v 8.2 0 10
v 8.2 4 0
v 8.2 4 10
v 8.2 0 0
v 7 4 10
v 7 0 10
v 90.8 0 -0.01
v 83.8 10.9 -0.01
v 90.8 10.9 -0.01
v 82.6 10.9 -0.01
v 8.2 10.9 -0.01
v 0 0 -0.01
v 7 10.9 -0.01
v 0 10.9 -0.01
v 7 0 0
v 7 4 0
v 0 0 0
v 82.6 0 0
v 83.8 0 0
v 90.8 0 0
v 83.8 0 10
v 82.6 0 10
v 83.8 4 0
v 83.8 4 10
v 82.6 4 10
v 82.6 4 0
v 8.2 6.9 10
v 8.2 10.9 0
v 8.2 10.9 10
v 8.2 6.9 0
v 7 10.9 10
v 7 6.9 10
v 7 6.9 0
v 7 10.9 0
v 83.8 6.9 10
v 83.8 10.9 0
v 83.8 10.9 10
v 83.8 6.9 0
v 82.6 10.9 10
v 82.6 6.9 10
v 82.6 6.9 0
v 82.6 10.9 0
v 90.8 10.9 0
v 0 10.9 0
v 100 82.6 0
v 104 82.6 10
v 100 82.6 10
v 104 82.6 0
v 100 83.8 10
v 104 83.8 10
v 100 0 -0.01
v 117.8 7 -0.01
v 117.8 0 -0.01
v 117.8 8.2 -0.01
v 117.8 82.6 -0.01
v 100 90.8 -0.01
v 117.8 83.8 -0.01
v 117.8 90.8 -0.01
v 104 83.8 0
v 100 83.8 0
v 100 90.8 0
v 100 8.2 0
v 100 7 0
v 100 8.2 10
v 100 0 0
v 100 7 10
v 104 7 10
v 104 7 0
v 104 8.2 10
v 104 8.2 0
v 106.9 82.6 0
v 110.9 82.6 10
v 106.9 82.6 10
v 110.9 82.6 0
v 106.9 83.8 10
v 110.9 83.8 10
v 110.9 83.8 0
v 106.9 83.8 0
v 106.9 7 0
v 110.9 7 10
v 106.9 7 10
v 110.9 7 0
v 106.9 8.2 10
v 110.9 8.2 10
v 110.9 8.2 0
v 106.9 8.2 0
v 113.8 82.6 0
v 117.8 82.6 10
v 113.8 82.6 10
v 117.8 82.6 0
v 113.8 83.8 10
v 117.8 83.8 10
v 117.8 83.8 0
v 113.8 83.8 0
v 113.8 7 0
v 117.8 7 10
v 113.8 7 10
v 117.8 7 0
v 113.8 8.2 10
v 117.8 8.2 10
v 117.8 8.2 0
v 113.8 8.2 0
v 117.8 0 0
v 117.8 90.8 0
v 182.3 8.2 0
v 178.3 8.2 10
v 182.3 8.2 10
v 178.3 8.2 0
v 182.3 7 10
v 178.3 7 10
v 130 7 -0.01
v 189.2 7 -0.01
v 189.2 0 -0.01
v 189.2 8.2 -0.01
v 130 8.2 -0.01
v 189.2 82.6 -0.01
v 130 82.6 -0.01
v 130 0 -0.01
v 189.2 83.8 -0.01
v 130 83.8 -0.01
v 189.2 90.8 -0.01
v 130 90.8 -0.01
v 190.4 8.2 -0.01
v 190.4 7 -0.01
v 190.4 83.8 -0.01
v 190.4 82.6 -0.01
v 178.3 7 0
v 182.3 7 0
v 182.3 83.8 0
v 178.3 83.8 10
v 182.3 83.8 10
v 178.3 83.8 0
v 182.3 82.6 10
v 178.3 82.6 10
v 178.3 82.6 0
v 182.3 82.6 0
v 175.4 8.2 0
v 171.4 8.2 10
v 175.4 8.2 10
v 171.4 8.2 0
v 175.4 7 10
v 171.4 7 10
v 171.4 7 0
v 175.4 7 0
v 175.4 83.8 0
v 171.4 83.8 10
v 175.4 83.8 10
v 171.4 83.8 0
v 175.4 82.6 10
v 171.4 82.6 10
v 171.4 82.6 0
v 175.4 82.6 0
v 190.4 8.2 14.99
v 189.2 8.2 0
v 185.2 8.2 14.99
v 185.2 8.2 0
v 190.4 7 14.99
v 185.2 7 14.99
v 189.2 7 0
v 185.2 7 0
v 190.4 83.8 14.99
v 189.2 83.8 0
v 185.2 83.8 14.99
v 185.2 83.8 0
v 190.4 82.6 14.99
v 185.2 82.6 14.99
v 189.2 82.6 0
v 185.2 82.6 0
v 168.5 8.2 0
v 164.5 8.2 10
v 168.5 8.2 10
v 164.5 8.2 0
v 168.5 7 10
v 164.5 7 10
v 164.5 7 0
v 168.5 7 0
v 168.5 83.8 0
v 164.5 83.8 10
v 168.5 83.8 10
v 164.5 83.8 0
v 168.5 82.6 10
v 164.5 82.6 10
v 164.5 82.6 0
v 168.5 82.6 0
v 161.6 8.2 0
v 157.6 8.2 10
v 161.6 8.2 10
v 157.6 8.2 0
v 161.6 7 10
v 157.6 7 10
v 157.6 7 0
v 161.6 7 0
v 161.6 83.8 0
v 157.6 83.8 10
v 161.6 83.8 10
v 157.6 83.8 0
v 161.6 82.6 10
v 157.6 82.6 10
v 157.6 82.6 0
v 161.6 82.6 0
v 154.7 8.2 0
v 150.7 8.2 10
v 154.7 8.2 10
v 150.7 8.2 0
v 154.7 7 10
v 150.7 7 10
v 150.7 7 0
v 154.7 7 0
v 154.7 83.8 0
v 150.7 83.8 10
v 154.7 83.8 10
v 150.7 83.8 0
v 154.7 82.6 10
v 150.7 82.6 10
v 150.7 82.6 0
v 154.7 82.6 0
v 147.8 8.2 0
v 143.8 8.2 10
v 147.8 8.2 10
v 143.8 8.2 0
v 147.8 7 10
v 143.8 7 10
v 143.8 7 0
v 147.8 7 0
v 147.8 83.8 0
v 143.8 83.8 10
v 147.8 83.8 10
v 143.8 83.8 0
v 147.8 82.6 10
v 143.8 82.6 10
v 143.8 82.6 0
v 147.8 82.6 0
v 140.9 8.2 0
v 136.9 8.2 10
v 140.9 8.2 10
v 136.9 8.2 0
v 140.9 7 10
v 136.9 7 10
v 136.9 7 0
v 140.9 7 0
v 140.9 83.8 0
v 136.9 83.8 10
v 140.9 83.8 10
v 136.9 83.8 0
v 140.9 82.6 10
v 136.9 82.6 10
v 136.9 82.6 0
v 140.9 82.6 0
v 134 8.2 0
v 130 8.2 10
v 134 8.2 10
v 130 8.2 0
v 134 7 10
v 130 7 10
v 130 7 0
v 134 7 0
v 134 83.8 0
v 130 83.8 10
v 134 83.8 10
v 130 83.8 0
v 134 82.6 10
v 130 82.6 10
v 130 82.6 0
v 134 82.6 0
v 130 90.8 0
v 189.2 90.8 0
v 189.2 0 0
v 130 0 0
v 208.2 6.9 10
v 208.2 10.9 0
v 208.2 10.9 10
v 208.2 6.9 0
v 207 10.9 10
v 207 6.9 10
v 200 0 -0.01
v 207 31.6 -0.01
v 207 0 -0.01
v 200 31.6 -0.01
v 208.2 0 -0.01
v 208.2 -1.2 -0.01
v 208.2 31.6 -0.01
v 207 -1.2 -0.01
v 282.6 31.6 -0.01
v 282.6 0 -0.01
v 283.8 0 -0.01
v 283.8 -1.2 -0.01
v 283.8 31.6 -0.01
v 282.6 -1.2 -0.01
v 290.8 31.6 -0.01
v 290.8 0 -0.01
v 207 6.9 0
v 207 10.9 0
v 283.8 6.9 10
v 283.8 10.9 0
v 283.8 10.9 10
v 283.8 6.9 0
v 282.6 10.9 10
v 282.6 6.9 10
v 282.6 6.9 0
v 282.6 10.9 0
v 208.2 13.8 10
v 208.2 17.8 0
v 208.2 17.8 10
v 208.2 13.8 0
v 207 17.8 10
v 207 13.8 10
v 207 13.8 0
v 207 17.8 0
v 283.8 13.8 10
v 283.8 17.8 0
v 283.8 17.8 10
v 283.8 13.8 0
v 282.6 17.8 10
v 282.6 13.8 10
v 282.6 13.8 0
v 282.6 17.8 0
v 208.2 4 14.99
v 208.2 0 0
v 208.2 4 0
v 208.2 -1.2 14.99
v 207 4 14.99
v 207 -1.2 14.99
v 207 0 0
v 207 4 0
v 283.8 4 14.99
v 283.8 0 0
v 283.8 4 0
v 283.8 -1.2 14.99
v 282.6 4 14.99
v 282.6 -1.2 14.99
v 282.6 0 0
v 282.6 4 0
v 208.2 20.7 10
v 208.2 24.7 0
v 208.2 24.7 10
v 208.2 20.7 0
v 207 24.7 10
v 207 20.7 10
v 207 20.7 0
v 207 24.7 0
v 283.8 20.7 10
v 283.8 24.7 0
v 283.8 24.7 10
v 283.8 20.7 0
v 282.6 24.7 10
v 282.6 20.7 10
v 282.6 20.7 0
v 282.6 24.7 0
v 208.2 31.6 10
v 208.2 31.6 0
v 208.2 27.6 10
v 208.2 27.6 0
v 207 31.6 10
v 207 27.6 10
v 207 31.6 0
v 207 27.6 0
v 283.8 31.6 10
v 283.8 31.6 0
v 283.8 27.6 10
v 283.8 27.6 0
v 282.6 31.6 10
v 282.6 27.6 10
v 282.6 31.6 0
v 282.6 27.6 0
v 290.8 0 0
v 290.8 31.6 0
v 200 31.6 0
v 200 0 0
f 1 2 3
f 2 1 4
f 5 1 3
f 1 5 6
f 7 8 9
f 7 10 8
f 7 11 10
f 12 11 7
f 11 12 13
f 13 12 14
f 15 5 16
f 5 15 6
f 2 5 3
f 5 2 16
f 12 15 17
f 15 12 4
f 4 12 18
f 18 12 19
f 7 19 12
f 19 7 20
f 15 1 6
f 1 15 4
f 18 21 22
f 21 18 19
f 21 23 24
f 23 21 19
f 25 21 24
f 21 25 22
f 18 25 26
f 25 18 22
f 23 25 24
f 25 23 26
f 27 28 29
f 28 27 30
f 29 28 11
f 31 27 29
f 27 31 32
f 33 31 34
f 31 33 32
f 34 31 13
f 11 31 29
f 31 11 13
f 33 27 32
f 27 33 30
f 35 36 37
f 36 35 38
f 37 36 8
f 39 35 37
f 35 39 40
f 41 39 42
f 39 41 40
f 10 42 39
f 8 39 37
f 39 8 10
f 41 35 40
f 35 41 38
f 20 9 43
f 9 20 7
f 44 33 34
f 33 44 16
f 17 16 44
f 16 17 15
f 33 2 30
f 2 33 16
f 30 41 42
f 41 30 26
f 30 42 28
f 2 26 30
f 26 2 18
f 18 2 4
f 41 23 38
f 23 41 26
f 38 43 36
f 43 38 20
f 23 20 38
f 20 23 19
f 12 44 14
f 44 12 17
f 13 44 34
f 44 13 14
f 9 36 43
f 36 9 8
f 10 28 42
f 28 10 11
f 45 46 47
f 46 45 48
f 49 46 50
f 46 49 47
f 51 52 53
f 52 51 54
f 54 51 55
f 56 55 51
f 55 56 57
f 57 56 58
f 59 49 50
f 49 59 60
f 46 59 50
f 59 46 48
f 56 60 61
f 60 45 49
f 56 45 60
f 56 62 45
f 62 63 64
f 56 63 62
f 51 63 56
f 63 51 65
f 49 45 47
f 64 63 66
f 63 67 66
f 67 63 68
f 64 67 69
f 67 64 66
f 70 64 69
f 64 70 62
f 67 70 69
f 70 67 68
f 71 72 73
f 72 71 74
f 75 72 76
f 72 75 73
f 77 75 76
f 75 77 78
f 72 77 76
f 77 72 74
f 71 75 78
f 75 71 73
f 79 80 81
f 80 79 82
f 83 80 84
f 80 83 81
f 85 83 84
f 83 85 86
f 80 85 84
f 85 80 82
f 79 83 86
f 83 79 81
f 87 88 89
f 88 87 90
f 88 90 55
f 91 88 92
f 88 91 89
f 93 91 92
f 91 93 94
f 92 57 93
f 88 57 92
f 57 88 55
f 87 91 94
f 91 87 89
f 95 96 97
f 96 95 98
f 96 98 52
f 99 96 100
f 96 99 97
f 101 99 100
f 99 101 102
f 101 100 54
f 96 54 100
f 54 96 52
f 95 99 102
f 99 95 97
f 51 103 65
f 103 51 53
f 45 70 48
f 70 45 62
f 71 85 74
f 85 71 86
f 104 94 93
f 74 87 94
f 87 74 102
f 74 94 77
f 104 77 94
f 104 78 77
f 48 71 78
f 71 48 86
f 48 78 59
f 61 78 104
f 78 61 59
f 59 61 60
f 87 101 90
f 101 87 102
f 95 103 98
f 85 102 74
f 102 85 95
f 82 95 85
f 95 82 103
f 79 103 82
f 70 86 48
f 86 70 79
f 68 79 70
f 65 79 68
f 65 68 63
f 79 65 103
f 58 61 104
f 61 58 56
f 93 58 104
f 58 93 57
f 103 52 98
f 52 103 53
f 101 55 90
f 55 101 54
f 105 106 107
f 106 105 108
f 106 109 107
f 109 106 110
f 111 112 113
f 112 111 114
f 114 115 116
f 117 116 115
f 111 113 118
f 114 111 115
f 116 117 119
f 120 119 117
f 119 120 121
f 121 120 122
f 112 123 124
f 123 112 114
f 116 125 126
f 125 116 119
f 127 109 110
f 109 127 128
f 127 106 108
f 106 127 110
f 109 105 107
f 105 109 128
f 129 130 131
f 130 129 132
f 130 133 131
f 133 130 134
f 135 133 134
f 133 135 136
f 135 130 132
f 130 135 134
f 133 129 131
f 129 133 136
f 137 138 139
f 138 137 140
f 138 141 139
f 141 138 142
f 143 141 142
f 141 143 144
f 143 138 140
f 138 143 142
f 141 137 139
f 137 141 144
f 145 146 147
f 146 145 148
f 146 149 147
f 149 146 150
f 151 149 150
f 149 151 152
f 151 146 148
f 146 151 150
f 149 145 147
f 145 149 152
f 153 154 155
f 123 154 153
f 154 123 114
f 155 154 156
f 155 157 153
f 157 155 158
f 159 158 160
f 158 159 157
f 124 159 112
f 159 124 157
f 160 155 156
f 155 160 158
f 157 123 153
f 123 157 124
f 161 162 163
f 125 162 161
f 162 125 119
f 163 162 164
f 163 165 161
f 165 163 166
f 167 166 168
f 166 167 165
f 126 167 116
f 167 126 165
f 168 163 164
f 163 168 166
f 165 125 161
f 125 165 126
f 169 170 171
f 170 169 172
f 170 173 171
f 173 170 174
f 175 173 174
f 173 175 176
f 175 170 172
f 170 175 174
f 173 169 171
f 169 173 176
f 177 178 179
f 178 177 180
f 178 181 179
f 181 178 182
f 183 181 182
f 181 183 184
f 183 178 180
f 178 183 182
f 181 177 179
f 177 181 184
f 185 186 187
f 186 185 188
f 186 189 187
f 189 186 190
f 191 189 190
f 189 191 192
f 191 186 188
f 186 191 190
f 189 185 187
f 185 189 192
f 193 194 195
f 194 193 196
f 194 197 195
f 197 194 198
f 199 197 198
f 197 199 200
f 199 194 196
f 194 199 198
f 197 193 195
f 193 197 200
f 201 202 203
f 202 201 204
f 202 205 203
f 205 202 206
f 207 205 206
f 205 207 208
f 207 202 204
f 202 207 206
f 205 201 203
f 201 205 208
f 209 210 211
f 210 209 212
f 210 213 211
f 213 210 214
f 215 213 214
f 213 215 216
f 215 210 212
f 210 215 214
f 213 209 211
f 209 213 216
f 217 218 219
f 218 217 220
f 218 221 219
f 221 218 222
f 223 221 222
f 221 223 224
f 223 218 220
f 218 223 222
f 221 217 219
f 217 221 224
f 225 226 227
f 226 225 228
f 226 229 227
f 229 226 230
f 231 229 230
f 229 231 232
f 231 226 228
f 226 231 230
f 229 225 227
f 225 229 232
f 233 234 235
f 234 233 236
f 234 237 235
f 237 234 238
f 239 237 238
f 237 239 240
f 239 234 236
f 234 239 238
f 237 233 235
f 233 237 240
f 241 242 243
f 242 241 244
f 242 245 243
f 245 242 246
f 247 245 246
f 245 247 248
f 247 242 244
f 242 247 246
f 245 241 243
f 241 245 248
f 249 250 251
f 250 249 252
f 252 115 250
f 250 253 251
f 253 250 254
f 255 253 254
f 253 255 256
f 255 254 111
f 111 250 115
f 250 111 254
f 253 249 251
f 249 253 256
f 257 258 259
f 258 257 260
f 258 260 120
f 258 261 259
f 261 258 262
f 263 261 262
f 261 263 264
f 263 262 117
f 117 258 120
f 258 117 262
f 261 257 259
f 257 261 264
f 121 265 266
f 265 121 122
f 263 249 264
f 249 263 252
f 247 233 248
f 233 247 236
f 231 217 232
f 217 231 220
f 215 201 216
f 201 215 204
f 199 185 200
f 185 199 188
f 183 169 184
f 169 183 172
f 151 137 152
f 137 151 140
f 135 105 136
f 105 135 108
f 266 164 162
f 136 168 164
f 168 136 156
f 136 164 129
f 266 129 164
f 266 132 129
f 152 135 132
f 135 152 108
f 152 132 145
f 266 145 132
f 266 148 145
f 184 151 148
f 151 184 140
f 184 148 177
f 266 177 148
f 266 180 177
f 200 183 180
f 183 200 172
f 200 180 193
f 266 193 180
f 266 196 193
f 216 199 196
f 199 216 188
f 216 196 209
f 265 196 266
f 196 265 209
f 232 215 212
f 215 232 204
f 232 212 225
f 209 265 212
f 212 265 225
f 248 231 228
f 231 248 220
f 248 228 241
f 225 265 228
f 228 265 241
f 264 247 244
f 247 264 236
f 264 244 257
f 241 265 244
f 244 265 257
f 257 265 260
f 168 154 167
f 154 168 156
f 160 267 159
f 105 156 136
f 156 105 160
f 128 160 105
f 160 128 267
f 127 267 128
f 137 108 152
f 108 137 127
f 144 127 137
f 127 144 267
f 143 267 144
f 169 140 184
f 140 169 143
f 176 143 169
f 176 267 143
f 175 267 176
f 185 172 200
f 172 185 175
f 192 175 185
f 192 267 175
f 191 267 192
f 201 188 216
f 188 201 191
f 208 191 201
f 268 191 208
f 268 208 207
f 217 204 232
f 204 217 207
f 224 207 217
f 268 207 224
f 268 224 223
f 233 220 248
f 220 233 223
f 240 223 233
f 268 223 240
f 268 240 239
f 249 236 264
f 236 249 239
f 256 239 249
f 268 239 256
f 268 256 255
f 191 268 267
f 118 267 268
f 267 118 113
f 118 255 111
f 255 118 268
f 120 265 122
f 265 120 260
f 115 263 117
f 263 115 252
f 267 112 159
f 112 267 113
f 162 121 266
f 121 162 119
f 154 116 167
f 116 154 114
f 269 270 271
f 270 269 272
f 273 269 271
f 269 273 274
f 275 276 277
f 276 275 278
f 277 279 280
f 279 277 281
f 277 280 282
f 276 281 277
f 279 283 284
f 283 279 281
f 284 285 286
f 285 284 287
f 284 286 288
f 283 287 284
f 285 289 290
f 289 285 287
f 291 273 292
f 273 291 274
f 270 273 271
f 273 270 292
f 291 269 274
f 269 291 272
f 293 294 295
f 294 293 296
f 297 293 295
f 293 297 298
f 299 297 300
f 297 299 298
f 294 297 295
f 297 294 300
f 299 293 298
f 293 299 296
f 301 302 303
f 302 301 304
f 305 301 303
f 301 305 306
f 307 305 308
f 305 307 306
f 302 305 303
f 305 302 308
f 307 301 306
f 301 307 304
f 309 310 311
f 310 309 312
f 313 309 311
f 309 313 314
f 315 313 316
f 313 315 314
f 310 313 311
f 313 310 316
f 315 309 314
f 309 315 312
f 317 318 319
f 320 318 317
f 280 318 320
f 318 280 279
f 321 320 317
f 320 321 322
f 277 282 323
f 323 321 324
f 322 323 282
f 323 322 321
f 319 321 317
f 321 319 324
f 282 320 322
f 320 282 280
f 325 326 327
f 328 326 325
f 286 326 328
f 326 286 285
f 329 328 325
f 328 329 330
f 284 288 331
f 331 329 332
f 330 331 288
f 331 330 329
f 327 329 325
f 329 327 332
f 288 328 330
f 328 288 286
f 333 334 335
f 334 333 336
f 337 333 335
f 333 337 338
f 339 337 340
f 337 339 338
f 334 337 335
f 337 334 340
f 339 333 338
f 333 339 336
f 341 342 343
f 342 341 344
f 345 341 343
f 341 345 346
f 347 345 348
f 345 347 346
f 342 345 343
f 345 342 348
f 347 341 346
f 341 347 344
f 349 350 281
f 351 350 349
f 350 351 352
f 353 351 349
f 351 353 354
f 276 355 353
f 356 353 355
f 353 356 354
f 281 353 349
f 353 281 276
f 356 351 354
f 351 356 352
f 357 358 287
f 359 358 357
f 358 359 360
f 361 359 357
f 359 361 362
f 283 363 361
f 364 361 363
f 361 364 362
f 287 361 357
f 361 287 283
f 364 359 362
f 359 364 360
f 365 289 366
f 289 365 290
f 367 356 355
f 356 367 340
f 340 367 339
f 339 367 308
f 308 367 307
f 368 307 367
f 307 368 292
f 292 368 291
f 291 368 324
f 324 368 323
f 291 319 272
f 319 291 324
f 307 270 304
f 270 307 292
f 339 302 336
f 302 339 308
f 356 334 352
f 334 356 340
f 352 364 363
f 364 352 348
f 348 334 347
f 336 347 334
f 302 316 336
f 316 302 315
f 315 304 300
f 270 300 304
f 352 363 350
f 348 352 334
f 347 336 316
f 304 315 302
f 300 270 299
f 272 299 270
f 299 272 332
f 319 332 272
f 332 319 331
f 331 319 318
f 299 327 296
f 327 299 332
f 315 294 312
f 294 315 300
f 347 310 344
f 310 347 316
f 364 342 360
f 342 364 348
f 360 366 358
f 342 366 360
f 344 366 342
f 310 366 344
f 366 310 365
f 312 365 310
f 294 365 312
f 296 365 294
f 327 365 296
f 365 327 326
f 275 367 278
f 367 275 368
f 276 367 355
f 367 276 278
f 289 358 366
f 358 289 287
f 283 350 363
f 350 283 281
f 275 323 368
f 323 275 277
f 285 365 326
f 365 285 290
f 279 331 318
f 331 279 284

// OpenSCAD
// file: ../../Base/Boxes.scad
// Fischertechnik Box Foundation
// Pre-designed Boxes

use <Constants.scad>

include <PlacementOptions.scad>

box190Width = 190;
box190Depth = 130;
box130Width = 130;
box130Depth = 95;
boxUsageHeight = 33.9;
boxWallThickness = 2.4;
boxBaseThickness = 1.0;

// getBoxWallThickness()
// Gets the wall thickness of a Fischertechnik Box

function getBoxWallThickness() = boxWallThickness;

// Gets the usable height of a fischertechnik box
function getBoxUsageHeight() = boxUsageHeight;

// Gets the thickness of the Fischertechnik box base.
function getBoxBaseThickness() = boxBaseThickness;

// Gets the usable inner space of a Box 190 as an x/y-list
function getBox190Space() = [
    box190Width - 2*getBoxWallThickness(), 
    box190Depth - 2*getBoxWallThickness() ];

// Imports the Fischertechnik empty box 130x190 mm and places it at position 0,0
// 190x130 are the outer sizes, the inner space is slightly smaller. Use getBox190Space() to get the inner sizes.
// This module needs the STL file "Fischertechnik Box 130x190.stl" in the library path.
// The box is positioned that the usable inner space is at the 0,0,0 position. The

module Box190() {
    translate([-getBoxWallThickness(),-getBoxWallThickness(),-getBoxBaseThickness()])
        import("Fischertechnik Box 130x190.stl", convexity=3);
}

// Gets the usable inner space of a Box 130 as an x/y-list
function getBox130Space() = [
    box130Width - 2*getBoxWallThickness(), 
    box130Depth - 2*getBoxWallThickness() ];

// Imports the Fischertechnik empty box 95x130 mm and places it at position 0,0
// 190x130 are the outer sizes, the inner space is slightly smaller. Use getBox190Space() to get the inner sizes.
// This module needs the STL file "Fischertechnik Box 95x130.stl" in the library path.
// The box is positioned that the usable inner space is at the 0,0,0 position. The

module Box130() {
    translate([-getBoxWallThickness(),-getBoxWallThickness(),-getBoxBaseThickness()])
        import("Fischertechnik Box 95x130.stl", convexity=3);
}

// Creates a web at the specified box walls
// corner 0 = LowerLeft, 1 = UpperLeft, 2 = UpperRight, 3 = LowerRight
// side 0 = LeftOfCorner, 1 = RightOfCorner
// distance = Distance in mm from the corner
// box = inner width and depth of the box (default: Box 190)
// webWidth = length of the web (default is 3 mms)
// webThickness = thickness of the web (default is 1 mm)

module BoxWeb(corner, side, distance, box=getBox190Space(), webWidth=3, webThickness=1.0) {
    sink = getBoxWallThickness()/2;

    width = (corner % 2 == 0) ? 
            (side == LeftOfCorner ? webWidth : webThickness) :
            (side == LeftOfCorner ? webThickness : webWidth);

    depth = (corner % 2 == 0) ? 
            (side == RightOfCorner ? webWidth : webThickness) :
            (side == RightOfCorner ? webThickness : webWidth);
    
    xDiff = corner == LowerLeft ? 
                (side == LeftOfCorner ? -sink : distance) :
            (corner == UpperLeft ?                
                (side == LeftOfCorner ? distance : -sink) :
            (corner == UpperRight ?
                (side == LeftOfCorner ? box.x-webWidth+sink : box.x-distance-webThickness) :
                (side == LeftOfCorner ? box.x-distance-webThickness: box.x-webWidth+sink)));

    yDiff = corner == LowerLeft ? 
                (side == RightOfCorner ? -sink : distance) :
            (corner == UpperLeft ?
                (side == RightOfCorner ? box.y-distance : box.y-webWidth+sink) :
            (corner == UpperRight ?
                (side == RightOfCorner ? box.y-webWidth+sink : box.y-distance) :
                (side == RightOfCorner ? distance : -sink)));
    
    translate([xDiff, yDiff, -getExcess()])
        cube([width, depth, boxUsageHeight + 2*getExcess()]);
}
// file: ../../Base/Rotation.scad
// Fischertechnik Box Foundation
// Geometry Helpers Rotation

include <PlacementOptions.scad>

// getRotatedSpace(space, rotation=NoRotation)
// Rotates the space dependent on the specified rotation

function getRotatedSpace(space, rotation=NoRotation) = [
    (rotation == Rotate90 || rotation == Rotate270) ? space.y : space.x,
    (rotation == Rotate90 || rotation == Rotate270) ? space.x : space.y
];

// Rotates the given space around the fixed left lower corner
// space = the space the children needs as width/depth list [width,depth]
// rotation = 0 Rotate0 degrees, 1 Rotate90 degrees, 2 Rotate180 degrees, 3 Rotate270 degrees (equivalent to -90)

module RotateFix(space, rotation=Rotate0) {
    dy = (rotation == Rotate0 || rotation == Rotate270) ? 0 :
        (rotation == Rotate90) ? space.x :
        space.y;
    dx = (rotation < Rotate180) ? 0 :
        (rotation == Rotate180) ? space.x :
        space.y;
    
    translate([dx, dy, 0])
        rotate([0, 0, rotations[rotation]])
            children();
}
// file: ../../Base/Alignment.scad
// Fischertechnik Box Foundation
// Geometry Helpers Alignment

include <PlacementOptions.scad>

// getAlignedX(elementWidth, spaceWidth, align=AlignRight, offset=0)
// Gets the aligned X offset of an element with the given
// width in the given space.
// elementWidth = The width of the element to positon
// spaceWidth = The space where the element should be aligned
// align = 0 AlignLeft, 1 AlignCenter, 2 AlignRight
// offset = an optional offset from the aligned position. When
// aligned left or centered, then positive values are in X direction.
// When aligned right then positive values are in negative X direction.

function getAlignedX(elementWidth, spaceWidth, align=AlignRight, offset=0) =
    (align == AlignLeft) ?
        offset :
        ((align == AlignCenter) ?
        (spaceWidth - elementWidth)/2 + offset :
        spaceWidth - offset - elementWidth);

// getAlignedY(elementDepth, spaceDepth, align=AlignTop, offset=0)
// Gets the aligned Y offset of an element with the given
// depth in the given space.
// elementDepth = The depth of the element to positon
// spaceDepth = The space where the element should be aligned
// align = 0 AlignBottom, 1 AlignCenter, 2 AlignTop
// offset = an optional offset from the aligned position. When
// aligned bottom or centered, then positive values are in Y direction.
// When aligned top then positive values are in negative Y direction.

function getAlignedY(elementDepth, spaceDepth, align=AlignTop, offset=0) =
    (align == AlignBottom) ?
        offset :
        ((align == AlignCenter) ?
        (spaceDepth - elementDepth)/2 + offset :
        spaceDepth - offset - elementDepth);
// file: ../../Base/Constants.scad
// Fischertechnik Box Foundation
// Constants

// Constant values necessary for multiple elements

// Base constants
dividerThickness = 1.2;
excess = 0.01;
fragments = 90;
tolerance = 0.8;

// Gets the thickness of a divider 
function getDividerThickness() = dividerThickness;

// Gets the excess that is used to merge walls into each other
function getExcess() = excess;

// Gets amount of fragments of a cylinder
function getFragments() = fragments;

// Gets the inner tolerance of a frame to each side
function getTolerance() = tolerance;


// Fischertechnik specific constants
axisDiameter = 4;
axisBottomDiameter = axisDiameter + 1;
standardEdgeDistance = 2.5;
standardWebDistance = 11.5;
standardCornerLength = 15;
tubeWallFactor = 1.6;

// Gets axis diameter
function getAxisDiameter() = axisDiameter;

// Gets axis bottom diameter for thicker part at the bottom
function getAxisBottomDiameter() = axisBottomDiameter;

// gets the standard distance to the wall of the box for dockable frames with webs
function getStandardEdgeDistance() = standardEdgeDistance;

// gets the standard distance of each web to the corner of the dockable frame
function getStandardWebDistance() = standardWebDistance;

// gets the standard length of the corner walls of a dockable frame
function getStandardCornerLength() = standardCornerLength;

// gets the wall thickness of a tube.
function getTubeWallThickness() = tubeWallFactor * getDividerThickness();
// file: ../../Base/PlacementOptions.scad
// Fischertechnik Box Foundation
// Placement Options

// Alignment
NoAlign = 0;
AlignLeft = 1;
AlignBottom = 2;
AlignCenter = 3;
AlignRight = 4;
AlignTop = 5;

// Element rotation degree steps
rotations = [0, -90, -180, -270];

// Rotation
NoRotation = 0;
Rotate0 = 0;
Rotate90 = 1;
Rotate180 = 2;
Rotate270 = 3;

// Docking (seen from above)
NoDock = -1;
DockLeft = 0;
DockTop = 1;
DockRight = 2;
DockCorner = 2;
DockBottom = 3;

// Web corners
LowerLeft = 0;
UpperLeft = 1;
UpperRight = 2;
LowerRight = 3;

// Web position relative to corner
LeftOfCorner = 0;
RightOfCorner = 1;
// file: ../../Elements/HolderBuildingPlate90x30.scad
// Fischertechnik Box Library
// Holder for Building Plate 90x30
// 38251

use <../ModelBase/Complex.scad>

width = 90;

// getHolderBuildingPlateSpace90x30(count = 1)
// Gets the width (.x) and depth (.y) space the holder needs.

function getHolderBuildingPlate90x30Space(count = 1) = getHolderBuildingPlateSpace(width, count);

// HolderBuildingPlate90x30(count=1, dock=false)
// Holder for building plates 90x30
// count = Count of building plates (default 1)
// dock = true if the holders are docked to the box wall (default false) 

module HolderBuildingPlate90x30(count = 1, dock = false) {
    HolderBuildingPlate(width, count, firstGapHigher = dock);
}

// Test
color("lightgray")
HolderBuildingPlate90x30(4);
// file: ../../Base/Placement.scad
// Fischertechnik Box Foundation
// Geometry Helpers Placement

use <Constants.scad>
use <Alignment.scad>
use <Rotation.scad>
use <Boxes.scad>

include <PlacementOptions.scad>

// Place(x=0, y=0, elementSpace=[0,0], alignX=AlignLeft, alignY=AlignBottom, rotation=Rotate0, boxSpace=getBox190Space())
// Places the child at the specified position
// y = Y-Position. This is a relative position when an X aligment is specified.
// x = X-Position. This is a relative position when an Y aligment is specified.
// elementSpace = space of the element to be placed [x,y]
// alignX = -1=NoAlign, 0 AlignLeft, 1 AlignCenter, 3 AlignRight (elementSpace and boxSpace required!)
// alignY = -1=NoAlign, 2 AlignBottom, 1 AlignCenter, 4 AlignTop (elementSpace and boxSpace required!)
// rotation = 0 Rotate0 0 degrees, 1 Rotate90 90 degrees, 
// 2 Rotate180 180 degrees, 3 Rotate270 270 degrees (equivalent to -90)
// boxSpace = Inner space of the box where the placement occurs [x,y] - default is Box 190x130 inner space

module Place(x=0, y=0, elementSpace=[0,0], 
  alignX=AlignLeft, alignY=AlignBottom, 
  rotation=NoRotation, boxSpace=getBox190Space()) {

    module Position(x, y, space, rotation=Rotate0) {
        translate([x, y, 0])
            RotateFix(space, rotation)
                children(0);
    }

    space = getRotatedSpace(elementSpace, rotation);
    alignedX = getAlignedX(space.x, boxSpace.x, alignX, x);
    alignedY = getAlignedY(space.y, boxSpace.y, alignY, y);
    Position(alignedX, alignedY, elementSpace, rotation)
        children(0);
}

// Center(space=getBox130Space(), elementSpace=[0,0])
// space = Space where the children is centered. For cylinder use centered=true and no elementSpace.
// elementSpace = space of the element to be centered [x,y]

module Center(space=getBox190Space(), elementSpace=[0,0]) {
    translate([(space.x - elementSpace.x) / 2, (space.y - elementSpace.y) / 2])
        children(0);
}

// CenterHorizontal(width=0, y=0, offset=0, space=getBox130Space())
// space = Space where the children is centered. For cylinder use centered=true and no elementSpace.
// elementSpace = space of the element to be centered [x,y]

module CenterHorizontal(width=0, y=0, offset=0, space=getBox190Space()) {
    translate([(space.x - width) / 2 + offset, y])
        children(0);
}

// CenterVertical(depth=0, x=0, offset=0, space=getBox130Space())
// space = Space where the children is centered. For cylinder use centered=true and no elementSpace.
// elementSpace = space of the element to be centered [x,y]

module CenterVerticalal(depth=0, x=0, offset=0, space=getBox190Space()) {
    translate([x, (space.y - depth) / 2 + offset])
        children(0);
}
// main file
// Fischertechnik Box Foundation
// Elements
// Test HolderBuildingPlate90x30

use <../../Base/Placement.scad>
use <../../Elements/HolderBuildingPlate90x30.scad>

include <../../Base/PlacementOptions.scad>

HolderBuildingPlate90x30();

Place(100, 0, elementSpace=getHolderBuildingPlate90x30Space(2), rotation=Rotate90)
    HolderBuildingPlate90x30(2);

Place(130, 0, elementSpace=getHolderBuildingPlate90x30Space(8), rotation=Rotate270)
    HolderBuildingPlate90x30(8, true);

Place(200, 0)
    HolderBuildingPlate90x30(4, true);
